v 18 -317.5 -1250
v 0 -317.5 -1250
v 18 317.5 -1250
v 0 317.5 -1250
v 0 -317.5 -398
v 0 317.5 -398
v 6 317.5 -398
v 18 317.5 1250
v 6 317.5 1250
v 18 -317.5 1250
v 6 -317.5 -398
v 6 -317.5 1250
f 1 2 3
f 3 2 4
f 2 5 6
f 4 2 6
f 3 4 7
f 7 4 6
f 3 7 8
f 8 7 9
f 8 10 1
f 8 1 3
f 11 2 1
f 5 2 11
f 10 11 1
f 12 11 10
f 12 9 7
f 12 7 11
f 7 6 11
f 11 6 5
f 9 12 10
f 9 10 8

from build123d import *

# Parameters (mm, degrees)
F0_W     = 635
F0_H     = 2500
F1_DEPTH = 18
F2_W     = 635
F2_H     = 1648
F3_DEPTH = 6


with BuildPart() as f1:
    # F0 (on Right) → F1 (new body)
    with BuildSketch(Plane.YZ):
        Rectangle(F0_W, F0_H)
    extrude(amount=F1_DEPTH)

    # F2 (on face) → F3 (cut)
    with BuildSketch(Plane(origin=(0, 0, 0), x_dir=(0, -1, 0), z_dir=(-1, 0, 0))):
        with Locations((0, 426)):
            Rectangle(F2_W, F2_H)
    extrude(amount=-F3_DEPTH, mode=Mode.SUBTRACT)


solid = f1.part
